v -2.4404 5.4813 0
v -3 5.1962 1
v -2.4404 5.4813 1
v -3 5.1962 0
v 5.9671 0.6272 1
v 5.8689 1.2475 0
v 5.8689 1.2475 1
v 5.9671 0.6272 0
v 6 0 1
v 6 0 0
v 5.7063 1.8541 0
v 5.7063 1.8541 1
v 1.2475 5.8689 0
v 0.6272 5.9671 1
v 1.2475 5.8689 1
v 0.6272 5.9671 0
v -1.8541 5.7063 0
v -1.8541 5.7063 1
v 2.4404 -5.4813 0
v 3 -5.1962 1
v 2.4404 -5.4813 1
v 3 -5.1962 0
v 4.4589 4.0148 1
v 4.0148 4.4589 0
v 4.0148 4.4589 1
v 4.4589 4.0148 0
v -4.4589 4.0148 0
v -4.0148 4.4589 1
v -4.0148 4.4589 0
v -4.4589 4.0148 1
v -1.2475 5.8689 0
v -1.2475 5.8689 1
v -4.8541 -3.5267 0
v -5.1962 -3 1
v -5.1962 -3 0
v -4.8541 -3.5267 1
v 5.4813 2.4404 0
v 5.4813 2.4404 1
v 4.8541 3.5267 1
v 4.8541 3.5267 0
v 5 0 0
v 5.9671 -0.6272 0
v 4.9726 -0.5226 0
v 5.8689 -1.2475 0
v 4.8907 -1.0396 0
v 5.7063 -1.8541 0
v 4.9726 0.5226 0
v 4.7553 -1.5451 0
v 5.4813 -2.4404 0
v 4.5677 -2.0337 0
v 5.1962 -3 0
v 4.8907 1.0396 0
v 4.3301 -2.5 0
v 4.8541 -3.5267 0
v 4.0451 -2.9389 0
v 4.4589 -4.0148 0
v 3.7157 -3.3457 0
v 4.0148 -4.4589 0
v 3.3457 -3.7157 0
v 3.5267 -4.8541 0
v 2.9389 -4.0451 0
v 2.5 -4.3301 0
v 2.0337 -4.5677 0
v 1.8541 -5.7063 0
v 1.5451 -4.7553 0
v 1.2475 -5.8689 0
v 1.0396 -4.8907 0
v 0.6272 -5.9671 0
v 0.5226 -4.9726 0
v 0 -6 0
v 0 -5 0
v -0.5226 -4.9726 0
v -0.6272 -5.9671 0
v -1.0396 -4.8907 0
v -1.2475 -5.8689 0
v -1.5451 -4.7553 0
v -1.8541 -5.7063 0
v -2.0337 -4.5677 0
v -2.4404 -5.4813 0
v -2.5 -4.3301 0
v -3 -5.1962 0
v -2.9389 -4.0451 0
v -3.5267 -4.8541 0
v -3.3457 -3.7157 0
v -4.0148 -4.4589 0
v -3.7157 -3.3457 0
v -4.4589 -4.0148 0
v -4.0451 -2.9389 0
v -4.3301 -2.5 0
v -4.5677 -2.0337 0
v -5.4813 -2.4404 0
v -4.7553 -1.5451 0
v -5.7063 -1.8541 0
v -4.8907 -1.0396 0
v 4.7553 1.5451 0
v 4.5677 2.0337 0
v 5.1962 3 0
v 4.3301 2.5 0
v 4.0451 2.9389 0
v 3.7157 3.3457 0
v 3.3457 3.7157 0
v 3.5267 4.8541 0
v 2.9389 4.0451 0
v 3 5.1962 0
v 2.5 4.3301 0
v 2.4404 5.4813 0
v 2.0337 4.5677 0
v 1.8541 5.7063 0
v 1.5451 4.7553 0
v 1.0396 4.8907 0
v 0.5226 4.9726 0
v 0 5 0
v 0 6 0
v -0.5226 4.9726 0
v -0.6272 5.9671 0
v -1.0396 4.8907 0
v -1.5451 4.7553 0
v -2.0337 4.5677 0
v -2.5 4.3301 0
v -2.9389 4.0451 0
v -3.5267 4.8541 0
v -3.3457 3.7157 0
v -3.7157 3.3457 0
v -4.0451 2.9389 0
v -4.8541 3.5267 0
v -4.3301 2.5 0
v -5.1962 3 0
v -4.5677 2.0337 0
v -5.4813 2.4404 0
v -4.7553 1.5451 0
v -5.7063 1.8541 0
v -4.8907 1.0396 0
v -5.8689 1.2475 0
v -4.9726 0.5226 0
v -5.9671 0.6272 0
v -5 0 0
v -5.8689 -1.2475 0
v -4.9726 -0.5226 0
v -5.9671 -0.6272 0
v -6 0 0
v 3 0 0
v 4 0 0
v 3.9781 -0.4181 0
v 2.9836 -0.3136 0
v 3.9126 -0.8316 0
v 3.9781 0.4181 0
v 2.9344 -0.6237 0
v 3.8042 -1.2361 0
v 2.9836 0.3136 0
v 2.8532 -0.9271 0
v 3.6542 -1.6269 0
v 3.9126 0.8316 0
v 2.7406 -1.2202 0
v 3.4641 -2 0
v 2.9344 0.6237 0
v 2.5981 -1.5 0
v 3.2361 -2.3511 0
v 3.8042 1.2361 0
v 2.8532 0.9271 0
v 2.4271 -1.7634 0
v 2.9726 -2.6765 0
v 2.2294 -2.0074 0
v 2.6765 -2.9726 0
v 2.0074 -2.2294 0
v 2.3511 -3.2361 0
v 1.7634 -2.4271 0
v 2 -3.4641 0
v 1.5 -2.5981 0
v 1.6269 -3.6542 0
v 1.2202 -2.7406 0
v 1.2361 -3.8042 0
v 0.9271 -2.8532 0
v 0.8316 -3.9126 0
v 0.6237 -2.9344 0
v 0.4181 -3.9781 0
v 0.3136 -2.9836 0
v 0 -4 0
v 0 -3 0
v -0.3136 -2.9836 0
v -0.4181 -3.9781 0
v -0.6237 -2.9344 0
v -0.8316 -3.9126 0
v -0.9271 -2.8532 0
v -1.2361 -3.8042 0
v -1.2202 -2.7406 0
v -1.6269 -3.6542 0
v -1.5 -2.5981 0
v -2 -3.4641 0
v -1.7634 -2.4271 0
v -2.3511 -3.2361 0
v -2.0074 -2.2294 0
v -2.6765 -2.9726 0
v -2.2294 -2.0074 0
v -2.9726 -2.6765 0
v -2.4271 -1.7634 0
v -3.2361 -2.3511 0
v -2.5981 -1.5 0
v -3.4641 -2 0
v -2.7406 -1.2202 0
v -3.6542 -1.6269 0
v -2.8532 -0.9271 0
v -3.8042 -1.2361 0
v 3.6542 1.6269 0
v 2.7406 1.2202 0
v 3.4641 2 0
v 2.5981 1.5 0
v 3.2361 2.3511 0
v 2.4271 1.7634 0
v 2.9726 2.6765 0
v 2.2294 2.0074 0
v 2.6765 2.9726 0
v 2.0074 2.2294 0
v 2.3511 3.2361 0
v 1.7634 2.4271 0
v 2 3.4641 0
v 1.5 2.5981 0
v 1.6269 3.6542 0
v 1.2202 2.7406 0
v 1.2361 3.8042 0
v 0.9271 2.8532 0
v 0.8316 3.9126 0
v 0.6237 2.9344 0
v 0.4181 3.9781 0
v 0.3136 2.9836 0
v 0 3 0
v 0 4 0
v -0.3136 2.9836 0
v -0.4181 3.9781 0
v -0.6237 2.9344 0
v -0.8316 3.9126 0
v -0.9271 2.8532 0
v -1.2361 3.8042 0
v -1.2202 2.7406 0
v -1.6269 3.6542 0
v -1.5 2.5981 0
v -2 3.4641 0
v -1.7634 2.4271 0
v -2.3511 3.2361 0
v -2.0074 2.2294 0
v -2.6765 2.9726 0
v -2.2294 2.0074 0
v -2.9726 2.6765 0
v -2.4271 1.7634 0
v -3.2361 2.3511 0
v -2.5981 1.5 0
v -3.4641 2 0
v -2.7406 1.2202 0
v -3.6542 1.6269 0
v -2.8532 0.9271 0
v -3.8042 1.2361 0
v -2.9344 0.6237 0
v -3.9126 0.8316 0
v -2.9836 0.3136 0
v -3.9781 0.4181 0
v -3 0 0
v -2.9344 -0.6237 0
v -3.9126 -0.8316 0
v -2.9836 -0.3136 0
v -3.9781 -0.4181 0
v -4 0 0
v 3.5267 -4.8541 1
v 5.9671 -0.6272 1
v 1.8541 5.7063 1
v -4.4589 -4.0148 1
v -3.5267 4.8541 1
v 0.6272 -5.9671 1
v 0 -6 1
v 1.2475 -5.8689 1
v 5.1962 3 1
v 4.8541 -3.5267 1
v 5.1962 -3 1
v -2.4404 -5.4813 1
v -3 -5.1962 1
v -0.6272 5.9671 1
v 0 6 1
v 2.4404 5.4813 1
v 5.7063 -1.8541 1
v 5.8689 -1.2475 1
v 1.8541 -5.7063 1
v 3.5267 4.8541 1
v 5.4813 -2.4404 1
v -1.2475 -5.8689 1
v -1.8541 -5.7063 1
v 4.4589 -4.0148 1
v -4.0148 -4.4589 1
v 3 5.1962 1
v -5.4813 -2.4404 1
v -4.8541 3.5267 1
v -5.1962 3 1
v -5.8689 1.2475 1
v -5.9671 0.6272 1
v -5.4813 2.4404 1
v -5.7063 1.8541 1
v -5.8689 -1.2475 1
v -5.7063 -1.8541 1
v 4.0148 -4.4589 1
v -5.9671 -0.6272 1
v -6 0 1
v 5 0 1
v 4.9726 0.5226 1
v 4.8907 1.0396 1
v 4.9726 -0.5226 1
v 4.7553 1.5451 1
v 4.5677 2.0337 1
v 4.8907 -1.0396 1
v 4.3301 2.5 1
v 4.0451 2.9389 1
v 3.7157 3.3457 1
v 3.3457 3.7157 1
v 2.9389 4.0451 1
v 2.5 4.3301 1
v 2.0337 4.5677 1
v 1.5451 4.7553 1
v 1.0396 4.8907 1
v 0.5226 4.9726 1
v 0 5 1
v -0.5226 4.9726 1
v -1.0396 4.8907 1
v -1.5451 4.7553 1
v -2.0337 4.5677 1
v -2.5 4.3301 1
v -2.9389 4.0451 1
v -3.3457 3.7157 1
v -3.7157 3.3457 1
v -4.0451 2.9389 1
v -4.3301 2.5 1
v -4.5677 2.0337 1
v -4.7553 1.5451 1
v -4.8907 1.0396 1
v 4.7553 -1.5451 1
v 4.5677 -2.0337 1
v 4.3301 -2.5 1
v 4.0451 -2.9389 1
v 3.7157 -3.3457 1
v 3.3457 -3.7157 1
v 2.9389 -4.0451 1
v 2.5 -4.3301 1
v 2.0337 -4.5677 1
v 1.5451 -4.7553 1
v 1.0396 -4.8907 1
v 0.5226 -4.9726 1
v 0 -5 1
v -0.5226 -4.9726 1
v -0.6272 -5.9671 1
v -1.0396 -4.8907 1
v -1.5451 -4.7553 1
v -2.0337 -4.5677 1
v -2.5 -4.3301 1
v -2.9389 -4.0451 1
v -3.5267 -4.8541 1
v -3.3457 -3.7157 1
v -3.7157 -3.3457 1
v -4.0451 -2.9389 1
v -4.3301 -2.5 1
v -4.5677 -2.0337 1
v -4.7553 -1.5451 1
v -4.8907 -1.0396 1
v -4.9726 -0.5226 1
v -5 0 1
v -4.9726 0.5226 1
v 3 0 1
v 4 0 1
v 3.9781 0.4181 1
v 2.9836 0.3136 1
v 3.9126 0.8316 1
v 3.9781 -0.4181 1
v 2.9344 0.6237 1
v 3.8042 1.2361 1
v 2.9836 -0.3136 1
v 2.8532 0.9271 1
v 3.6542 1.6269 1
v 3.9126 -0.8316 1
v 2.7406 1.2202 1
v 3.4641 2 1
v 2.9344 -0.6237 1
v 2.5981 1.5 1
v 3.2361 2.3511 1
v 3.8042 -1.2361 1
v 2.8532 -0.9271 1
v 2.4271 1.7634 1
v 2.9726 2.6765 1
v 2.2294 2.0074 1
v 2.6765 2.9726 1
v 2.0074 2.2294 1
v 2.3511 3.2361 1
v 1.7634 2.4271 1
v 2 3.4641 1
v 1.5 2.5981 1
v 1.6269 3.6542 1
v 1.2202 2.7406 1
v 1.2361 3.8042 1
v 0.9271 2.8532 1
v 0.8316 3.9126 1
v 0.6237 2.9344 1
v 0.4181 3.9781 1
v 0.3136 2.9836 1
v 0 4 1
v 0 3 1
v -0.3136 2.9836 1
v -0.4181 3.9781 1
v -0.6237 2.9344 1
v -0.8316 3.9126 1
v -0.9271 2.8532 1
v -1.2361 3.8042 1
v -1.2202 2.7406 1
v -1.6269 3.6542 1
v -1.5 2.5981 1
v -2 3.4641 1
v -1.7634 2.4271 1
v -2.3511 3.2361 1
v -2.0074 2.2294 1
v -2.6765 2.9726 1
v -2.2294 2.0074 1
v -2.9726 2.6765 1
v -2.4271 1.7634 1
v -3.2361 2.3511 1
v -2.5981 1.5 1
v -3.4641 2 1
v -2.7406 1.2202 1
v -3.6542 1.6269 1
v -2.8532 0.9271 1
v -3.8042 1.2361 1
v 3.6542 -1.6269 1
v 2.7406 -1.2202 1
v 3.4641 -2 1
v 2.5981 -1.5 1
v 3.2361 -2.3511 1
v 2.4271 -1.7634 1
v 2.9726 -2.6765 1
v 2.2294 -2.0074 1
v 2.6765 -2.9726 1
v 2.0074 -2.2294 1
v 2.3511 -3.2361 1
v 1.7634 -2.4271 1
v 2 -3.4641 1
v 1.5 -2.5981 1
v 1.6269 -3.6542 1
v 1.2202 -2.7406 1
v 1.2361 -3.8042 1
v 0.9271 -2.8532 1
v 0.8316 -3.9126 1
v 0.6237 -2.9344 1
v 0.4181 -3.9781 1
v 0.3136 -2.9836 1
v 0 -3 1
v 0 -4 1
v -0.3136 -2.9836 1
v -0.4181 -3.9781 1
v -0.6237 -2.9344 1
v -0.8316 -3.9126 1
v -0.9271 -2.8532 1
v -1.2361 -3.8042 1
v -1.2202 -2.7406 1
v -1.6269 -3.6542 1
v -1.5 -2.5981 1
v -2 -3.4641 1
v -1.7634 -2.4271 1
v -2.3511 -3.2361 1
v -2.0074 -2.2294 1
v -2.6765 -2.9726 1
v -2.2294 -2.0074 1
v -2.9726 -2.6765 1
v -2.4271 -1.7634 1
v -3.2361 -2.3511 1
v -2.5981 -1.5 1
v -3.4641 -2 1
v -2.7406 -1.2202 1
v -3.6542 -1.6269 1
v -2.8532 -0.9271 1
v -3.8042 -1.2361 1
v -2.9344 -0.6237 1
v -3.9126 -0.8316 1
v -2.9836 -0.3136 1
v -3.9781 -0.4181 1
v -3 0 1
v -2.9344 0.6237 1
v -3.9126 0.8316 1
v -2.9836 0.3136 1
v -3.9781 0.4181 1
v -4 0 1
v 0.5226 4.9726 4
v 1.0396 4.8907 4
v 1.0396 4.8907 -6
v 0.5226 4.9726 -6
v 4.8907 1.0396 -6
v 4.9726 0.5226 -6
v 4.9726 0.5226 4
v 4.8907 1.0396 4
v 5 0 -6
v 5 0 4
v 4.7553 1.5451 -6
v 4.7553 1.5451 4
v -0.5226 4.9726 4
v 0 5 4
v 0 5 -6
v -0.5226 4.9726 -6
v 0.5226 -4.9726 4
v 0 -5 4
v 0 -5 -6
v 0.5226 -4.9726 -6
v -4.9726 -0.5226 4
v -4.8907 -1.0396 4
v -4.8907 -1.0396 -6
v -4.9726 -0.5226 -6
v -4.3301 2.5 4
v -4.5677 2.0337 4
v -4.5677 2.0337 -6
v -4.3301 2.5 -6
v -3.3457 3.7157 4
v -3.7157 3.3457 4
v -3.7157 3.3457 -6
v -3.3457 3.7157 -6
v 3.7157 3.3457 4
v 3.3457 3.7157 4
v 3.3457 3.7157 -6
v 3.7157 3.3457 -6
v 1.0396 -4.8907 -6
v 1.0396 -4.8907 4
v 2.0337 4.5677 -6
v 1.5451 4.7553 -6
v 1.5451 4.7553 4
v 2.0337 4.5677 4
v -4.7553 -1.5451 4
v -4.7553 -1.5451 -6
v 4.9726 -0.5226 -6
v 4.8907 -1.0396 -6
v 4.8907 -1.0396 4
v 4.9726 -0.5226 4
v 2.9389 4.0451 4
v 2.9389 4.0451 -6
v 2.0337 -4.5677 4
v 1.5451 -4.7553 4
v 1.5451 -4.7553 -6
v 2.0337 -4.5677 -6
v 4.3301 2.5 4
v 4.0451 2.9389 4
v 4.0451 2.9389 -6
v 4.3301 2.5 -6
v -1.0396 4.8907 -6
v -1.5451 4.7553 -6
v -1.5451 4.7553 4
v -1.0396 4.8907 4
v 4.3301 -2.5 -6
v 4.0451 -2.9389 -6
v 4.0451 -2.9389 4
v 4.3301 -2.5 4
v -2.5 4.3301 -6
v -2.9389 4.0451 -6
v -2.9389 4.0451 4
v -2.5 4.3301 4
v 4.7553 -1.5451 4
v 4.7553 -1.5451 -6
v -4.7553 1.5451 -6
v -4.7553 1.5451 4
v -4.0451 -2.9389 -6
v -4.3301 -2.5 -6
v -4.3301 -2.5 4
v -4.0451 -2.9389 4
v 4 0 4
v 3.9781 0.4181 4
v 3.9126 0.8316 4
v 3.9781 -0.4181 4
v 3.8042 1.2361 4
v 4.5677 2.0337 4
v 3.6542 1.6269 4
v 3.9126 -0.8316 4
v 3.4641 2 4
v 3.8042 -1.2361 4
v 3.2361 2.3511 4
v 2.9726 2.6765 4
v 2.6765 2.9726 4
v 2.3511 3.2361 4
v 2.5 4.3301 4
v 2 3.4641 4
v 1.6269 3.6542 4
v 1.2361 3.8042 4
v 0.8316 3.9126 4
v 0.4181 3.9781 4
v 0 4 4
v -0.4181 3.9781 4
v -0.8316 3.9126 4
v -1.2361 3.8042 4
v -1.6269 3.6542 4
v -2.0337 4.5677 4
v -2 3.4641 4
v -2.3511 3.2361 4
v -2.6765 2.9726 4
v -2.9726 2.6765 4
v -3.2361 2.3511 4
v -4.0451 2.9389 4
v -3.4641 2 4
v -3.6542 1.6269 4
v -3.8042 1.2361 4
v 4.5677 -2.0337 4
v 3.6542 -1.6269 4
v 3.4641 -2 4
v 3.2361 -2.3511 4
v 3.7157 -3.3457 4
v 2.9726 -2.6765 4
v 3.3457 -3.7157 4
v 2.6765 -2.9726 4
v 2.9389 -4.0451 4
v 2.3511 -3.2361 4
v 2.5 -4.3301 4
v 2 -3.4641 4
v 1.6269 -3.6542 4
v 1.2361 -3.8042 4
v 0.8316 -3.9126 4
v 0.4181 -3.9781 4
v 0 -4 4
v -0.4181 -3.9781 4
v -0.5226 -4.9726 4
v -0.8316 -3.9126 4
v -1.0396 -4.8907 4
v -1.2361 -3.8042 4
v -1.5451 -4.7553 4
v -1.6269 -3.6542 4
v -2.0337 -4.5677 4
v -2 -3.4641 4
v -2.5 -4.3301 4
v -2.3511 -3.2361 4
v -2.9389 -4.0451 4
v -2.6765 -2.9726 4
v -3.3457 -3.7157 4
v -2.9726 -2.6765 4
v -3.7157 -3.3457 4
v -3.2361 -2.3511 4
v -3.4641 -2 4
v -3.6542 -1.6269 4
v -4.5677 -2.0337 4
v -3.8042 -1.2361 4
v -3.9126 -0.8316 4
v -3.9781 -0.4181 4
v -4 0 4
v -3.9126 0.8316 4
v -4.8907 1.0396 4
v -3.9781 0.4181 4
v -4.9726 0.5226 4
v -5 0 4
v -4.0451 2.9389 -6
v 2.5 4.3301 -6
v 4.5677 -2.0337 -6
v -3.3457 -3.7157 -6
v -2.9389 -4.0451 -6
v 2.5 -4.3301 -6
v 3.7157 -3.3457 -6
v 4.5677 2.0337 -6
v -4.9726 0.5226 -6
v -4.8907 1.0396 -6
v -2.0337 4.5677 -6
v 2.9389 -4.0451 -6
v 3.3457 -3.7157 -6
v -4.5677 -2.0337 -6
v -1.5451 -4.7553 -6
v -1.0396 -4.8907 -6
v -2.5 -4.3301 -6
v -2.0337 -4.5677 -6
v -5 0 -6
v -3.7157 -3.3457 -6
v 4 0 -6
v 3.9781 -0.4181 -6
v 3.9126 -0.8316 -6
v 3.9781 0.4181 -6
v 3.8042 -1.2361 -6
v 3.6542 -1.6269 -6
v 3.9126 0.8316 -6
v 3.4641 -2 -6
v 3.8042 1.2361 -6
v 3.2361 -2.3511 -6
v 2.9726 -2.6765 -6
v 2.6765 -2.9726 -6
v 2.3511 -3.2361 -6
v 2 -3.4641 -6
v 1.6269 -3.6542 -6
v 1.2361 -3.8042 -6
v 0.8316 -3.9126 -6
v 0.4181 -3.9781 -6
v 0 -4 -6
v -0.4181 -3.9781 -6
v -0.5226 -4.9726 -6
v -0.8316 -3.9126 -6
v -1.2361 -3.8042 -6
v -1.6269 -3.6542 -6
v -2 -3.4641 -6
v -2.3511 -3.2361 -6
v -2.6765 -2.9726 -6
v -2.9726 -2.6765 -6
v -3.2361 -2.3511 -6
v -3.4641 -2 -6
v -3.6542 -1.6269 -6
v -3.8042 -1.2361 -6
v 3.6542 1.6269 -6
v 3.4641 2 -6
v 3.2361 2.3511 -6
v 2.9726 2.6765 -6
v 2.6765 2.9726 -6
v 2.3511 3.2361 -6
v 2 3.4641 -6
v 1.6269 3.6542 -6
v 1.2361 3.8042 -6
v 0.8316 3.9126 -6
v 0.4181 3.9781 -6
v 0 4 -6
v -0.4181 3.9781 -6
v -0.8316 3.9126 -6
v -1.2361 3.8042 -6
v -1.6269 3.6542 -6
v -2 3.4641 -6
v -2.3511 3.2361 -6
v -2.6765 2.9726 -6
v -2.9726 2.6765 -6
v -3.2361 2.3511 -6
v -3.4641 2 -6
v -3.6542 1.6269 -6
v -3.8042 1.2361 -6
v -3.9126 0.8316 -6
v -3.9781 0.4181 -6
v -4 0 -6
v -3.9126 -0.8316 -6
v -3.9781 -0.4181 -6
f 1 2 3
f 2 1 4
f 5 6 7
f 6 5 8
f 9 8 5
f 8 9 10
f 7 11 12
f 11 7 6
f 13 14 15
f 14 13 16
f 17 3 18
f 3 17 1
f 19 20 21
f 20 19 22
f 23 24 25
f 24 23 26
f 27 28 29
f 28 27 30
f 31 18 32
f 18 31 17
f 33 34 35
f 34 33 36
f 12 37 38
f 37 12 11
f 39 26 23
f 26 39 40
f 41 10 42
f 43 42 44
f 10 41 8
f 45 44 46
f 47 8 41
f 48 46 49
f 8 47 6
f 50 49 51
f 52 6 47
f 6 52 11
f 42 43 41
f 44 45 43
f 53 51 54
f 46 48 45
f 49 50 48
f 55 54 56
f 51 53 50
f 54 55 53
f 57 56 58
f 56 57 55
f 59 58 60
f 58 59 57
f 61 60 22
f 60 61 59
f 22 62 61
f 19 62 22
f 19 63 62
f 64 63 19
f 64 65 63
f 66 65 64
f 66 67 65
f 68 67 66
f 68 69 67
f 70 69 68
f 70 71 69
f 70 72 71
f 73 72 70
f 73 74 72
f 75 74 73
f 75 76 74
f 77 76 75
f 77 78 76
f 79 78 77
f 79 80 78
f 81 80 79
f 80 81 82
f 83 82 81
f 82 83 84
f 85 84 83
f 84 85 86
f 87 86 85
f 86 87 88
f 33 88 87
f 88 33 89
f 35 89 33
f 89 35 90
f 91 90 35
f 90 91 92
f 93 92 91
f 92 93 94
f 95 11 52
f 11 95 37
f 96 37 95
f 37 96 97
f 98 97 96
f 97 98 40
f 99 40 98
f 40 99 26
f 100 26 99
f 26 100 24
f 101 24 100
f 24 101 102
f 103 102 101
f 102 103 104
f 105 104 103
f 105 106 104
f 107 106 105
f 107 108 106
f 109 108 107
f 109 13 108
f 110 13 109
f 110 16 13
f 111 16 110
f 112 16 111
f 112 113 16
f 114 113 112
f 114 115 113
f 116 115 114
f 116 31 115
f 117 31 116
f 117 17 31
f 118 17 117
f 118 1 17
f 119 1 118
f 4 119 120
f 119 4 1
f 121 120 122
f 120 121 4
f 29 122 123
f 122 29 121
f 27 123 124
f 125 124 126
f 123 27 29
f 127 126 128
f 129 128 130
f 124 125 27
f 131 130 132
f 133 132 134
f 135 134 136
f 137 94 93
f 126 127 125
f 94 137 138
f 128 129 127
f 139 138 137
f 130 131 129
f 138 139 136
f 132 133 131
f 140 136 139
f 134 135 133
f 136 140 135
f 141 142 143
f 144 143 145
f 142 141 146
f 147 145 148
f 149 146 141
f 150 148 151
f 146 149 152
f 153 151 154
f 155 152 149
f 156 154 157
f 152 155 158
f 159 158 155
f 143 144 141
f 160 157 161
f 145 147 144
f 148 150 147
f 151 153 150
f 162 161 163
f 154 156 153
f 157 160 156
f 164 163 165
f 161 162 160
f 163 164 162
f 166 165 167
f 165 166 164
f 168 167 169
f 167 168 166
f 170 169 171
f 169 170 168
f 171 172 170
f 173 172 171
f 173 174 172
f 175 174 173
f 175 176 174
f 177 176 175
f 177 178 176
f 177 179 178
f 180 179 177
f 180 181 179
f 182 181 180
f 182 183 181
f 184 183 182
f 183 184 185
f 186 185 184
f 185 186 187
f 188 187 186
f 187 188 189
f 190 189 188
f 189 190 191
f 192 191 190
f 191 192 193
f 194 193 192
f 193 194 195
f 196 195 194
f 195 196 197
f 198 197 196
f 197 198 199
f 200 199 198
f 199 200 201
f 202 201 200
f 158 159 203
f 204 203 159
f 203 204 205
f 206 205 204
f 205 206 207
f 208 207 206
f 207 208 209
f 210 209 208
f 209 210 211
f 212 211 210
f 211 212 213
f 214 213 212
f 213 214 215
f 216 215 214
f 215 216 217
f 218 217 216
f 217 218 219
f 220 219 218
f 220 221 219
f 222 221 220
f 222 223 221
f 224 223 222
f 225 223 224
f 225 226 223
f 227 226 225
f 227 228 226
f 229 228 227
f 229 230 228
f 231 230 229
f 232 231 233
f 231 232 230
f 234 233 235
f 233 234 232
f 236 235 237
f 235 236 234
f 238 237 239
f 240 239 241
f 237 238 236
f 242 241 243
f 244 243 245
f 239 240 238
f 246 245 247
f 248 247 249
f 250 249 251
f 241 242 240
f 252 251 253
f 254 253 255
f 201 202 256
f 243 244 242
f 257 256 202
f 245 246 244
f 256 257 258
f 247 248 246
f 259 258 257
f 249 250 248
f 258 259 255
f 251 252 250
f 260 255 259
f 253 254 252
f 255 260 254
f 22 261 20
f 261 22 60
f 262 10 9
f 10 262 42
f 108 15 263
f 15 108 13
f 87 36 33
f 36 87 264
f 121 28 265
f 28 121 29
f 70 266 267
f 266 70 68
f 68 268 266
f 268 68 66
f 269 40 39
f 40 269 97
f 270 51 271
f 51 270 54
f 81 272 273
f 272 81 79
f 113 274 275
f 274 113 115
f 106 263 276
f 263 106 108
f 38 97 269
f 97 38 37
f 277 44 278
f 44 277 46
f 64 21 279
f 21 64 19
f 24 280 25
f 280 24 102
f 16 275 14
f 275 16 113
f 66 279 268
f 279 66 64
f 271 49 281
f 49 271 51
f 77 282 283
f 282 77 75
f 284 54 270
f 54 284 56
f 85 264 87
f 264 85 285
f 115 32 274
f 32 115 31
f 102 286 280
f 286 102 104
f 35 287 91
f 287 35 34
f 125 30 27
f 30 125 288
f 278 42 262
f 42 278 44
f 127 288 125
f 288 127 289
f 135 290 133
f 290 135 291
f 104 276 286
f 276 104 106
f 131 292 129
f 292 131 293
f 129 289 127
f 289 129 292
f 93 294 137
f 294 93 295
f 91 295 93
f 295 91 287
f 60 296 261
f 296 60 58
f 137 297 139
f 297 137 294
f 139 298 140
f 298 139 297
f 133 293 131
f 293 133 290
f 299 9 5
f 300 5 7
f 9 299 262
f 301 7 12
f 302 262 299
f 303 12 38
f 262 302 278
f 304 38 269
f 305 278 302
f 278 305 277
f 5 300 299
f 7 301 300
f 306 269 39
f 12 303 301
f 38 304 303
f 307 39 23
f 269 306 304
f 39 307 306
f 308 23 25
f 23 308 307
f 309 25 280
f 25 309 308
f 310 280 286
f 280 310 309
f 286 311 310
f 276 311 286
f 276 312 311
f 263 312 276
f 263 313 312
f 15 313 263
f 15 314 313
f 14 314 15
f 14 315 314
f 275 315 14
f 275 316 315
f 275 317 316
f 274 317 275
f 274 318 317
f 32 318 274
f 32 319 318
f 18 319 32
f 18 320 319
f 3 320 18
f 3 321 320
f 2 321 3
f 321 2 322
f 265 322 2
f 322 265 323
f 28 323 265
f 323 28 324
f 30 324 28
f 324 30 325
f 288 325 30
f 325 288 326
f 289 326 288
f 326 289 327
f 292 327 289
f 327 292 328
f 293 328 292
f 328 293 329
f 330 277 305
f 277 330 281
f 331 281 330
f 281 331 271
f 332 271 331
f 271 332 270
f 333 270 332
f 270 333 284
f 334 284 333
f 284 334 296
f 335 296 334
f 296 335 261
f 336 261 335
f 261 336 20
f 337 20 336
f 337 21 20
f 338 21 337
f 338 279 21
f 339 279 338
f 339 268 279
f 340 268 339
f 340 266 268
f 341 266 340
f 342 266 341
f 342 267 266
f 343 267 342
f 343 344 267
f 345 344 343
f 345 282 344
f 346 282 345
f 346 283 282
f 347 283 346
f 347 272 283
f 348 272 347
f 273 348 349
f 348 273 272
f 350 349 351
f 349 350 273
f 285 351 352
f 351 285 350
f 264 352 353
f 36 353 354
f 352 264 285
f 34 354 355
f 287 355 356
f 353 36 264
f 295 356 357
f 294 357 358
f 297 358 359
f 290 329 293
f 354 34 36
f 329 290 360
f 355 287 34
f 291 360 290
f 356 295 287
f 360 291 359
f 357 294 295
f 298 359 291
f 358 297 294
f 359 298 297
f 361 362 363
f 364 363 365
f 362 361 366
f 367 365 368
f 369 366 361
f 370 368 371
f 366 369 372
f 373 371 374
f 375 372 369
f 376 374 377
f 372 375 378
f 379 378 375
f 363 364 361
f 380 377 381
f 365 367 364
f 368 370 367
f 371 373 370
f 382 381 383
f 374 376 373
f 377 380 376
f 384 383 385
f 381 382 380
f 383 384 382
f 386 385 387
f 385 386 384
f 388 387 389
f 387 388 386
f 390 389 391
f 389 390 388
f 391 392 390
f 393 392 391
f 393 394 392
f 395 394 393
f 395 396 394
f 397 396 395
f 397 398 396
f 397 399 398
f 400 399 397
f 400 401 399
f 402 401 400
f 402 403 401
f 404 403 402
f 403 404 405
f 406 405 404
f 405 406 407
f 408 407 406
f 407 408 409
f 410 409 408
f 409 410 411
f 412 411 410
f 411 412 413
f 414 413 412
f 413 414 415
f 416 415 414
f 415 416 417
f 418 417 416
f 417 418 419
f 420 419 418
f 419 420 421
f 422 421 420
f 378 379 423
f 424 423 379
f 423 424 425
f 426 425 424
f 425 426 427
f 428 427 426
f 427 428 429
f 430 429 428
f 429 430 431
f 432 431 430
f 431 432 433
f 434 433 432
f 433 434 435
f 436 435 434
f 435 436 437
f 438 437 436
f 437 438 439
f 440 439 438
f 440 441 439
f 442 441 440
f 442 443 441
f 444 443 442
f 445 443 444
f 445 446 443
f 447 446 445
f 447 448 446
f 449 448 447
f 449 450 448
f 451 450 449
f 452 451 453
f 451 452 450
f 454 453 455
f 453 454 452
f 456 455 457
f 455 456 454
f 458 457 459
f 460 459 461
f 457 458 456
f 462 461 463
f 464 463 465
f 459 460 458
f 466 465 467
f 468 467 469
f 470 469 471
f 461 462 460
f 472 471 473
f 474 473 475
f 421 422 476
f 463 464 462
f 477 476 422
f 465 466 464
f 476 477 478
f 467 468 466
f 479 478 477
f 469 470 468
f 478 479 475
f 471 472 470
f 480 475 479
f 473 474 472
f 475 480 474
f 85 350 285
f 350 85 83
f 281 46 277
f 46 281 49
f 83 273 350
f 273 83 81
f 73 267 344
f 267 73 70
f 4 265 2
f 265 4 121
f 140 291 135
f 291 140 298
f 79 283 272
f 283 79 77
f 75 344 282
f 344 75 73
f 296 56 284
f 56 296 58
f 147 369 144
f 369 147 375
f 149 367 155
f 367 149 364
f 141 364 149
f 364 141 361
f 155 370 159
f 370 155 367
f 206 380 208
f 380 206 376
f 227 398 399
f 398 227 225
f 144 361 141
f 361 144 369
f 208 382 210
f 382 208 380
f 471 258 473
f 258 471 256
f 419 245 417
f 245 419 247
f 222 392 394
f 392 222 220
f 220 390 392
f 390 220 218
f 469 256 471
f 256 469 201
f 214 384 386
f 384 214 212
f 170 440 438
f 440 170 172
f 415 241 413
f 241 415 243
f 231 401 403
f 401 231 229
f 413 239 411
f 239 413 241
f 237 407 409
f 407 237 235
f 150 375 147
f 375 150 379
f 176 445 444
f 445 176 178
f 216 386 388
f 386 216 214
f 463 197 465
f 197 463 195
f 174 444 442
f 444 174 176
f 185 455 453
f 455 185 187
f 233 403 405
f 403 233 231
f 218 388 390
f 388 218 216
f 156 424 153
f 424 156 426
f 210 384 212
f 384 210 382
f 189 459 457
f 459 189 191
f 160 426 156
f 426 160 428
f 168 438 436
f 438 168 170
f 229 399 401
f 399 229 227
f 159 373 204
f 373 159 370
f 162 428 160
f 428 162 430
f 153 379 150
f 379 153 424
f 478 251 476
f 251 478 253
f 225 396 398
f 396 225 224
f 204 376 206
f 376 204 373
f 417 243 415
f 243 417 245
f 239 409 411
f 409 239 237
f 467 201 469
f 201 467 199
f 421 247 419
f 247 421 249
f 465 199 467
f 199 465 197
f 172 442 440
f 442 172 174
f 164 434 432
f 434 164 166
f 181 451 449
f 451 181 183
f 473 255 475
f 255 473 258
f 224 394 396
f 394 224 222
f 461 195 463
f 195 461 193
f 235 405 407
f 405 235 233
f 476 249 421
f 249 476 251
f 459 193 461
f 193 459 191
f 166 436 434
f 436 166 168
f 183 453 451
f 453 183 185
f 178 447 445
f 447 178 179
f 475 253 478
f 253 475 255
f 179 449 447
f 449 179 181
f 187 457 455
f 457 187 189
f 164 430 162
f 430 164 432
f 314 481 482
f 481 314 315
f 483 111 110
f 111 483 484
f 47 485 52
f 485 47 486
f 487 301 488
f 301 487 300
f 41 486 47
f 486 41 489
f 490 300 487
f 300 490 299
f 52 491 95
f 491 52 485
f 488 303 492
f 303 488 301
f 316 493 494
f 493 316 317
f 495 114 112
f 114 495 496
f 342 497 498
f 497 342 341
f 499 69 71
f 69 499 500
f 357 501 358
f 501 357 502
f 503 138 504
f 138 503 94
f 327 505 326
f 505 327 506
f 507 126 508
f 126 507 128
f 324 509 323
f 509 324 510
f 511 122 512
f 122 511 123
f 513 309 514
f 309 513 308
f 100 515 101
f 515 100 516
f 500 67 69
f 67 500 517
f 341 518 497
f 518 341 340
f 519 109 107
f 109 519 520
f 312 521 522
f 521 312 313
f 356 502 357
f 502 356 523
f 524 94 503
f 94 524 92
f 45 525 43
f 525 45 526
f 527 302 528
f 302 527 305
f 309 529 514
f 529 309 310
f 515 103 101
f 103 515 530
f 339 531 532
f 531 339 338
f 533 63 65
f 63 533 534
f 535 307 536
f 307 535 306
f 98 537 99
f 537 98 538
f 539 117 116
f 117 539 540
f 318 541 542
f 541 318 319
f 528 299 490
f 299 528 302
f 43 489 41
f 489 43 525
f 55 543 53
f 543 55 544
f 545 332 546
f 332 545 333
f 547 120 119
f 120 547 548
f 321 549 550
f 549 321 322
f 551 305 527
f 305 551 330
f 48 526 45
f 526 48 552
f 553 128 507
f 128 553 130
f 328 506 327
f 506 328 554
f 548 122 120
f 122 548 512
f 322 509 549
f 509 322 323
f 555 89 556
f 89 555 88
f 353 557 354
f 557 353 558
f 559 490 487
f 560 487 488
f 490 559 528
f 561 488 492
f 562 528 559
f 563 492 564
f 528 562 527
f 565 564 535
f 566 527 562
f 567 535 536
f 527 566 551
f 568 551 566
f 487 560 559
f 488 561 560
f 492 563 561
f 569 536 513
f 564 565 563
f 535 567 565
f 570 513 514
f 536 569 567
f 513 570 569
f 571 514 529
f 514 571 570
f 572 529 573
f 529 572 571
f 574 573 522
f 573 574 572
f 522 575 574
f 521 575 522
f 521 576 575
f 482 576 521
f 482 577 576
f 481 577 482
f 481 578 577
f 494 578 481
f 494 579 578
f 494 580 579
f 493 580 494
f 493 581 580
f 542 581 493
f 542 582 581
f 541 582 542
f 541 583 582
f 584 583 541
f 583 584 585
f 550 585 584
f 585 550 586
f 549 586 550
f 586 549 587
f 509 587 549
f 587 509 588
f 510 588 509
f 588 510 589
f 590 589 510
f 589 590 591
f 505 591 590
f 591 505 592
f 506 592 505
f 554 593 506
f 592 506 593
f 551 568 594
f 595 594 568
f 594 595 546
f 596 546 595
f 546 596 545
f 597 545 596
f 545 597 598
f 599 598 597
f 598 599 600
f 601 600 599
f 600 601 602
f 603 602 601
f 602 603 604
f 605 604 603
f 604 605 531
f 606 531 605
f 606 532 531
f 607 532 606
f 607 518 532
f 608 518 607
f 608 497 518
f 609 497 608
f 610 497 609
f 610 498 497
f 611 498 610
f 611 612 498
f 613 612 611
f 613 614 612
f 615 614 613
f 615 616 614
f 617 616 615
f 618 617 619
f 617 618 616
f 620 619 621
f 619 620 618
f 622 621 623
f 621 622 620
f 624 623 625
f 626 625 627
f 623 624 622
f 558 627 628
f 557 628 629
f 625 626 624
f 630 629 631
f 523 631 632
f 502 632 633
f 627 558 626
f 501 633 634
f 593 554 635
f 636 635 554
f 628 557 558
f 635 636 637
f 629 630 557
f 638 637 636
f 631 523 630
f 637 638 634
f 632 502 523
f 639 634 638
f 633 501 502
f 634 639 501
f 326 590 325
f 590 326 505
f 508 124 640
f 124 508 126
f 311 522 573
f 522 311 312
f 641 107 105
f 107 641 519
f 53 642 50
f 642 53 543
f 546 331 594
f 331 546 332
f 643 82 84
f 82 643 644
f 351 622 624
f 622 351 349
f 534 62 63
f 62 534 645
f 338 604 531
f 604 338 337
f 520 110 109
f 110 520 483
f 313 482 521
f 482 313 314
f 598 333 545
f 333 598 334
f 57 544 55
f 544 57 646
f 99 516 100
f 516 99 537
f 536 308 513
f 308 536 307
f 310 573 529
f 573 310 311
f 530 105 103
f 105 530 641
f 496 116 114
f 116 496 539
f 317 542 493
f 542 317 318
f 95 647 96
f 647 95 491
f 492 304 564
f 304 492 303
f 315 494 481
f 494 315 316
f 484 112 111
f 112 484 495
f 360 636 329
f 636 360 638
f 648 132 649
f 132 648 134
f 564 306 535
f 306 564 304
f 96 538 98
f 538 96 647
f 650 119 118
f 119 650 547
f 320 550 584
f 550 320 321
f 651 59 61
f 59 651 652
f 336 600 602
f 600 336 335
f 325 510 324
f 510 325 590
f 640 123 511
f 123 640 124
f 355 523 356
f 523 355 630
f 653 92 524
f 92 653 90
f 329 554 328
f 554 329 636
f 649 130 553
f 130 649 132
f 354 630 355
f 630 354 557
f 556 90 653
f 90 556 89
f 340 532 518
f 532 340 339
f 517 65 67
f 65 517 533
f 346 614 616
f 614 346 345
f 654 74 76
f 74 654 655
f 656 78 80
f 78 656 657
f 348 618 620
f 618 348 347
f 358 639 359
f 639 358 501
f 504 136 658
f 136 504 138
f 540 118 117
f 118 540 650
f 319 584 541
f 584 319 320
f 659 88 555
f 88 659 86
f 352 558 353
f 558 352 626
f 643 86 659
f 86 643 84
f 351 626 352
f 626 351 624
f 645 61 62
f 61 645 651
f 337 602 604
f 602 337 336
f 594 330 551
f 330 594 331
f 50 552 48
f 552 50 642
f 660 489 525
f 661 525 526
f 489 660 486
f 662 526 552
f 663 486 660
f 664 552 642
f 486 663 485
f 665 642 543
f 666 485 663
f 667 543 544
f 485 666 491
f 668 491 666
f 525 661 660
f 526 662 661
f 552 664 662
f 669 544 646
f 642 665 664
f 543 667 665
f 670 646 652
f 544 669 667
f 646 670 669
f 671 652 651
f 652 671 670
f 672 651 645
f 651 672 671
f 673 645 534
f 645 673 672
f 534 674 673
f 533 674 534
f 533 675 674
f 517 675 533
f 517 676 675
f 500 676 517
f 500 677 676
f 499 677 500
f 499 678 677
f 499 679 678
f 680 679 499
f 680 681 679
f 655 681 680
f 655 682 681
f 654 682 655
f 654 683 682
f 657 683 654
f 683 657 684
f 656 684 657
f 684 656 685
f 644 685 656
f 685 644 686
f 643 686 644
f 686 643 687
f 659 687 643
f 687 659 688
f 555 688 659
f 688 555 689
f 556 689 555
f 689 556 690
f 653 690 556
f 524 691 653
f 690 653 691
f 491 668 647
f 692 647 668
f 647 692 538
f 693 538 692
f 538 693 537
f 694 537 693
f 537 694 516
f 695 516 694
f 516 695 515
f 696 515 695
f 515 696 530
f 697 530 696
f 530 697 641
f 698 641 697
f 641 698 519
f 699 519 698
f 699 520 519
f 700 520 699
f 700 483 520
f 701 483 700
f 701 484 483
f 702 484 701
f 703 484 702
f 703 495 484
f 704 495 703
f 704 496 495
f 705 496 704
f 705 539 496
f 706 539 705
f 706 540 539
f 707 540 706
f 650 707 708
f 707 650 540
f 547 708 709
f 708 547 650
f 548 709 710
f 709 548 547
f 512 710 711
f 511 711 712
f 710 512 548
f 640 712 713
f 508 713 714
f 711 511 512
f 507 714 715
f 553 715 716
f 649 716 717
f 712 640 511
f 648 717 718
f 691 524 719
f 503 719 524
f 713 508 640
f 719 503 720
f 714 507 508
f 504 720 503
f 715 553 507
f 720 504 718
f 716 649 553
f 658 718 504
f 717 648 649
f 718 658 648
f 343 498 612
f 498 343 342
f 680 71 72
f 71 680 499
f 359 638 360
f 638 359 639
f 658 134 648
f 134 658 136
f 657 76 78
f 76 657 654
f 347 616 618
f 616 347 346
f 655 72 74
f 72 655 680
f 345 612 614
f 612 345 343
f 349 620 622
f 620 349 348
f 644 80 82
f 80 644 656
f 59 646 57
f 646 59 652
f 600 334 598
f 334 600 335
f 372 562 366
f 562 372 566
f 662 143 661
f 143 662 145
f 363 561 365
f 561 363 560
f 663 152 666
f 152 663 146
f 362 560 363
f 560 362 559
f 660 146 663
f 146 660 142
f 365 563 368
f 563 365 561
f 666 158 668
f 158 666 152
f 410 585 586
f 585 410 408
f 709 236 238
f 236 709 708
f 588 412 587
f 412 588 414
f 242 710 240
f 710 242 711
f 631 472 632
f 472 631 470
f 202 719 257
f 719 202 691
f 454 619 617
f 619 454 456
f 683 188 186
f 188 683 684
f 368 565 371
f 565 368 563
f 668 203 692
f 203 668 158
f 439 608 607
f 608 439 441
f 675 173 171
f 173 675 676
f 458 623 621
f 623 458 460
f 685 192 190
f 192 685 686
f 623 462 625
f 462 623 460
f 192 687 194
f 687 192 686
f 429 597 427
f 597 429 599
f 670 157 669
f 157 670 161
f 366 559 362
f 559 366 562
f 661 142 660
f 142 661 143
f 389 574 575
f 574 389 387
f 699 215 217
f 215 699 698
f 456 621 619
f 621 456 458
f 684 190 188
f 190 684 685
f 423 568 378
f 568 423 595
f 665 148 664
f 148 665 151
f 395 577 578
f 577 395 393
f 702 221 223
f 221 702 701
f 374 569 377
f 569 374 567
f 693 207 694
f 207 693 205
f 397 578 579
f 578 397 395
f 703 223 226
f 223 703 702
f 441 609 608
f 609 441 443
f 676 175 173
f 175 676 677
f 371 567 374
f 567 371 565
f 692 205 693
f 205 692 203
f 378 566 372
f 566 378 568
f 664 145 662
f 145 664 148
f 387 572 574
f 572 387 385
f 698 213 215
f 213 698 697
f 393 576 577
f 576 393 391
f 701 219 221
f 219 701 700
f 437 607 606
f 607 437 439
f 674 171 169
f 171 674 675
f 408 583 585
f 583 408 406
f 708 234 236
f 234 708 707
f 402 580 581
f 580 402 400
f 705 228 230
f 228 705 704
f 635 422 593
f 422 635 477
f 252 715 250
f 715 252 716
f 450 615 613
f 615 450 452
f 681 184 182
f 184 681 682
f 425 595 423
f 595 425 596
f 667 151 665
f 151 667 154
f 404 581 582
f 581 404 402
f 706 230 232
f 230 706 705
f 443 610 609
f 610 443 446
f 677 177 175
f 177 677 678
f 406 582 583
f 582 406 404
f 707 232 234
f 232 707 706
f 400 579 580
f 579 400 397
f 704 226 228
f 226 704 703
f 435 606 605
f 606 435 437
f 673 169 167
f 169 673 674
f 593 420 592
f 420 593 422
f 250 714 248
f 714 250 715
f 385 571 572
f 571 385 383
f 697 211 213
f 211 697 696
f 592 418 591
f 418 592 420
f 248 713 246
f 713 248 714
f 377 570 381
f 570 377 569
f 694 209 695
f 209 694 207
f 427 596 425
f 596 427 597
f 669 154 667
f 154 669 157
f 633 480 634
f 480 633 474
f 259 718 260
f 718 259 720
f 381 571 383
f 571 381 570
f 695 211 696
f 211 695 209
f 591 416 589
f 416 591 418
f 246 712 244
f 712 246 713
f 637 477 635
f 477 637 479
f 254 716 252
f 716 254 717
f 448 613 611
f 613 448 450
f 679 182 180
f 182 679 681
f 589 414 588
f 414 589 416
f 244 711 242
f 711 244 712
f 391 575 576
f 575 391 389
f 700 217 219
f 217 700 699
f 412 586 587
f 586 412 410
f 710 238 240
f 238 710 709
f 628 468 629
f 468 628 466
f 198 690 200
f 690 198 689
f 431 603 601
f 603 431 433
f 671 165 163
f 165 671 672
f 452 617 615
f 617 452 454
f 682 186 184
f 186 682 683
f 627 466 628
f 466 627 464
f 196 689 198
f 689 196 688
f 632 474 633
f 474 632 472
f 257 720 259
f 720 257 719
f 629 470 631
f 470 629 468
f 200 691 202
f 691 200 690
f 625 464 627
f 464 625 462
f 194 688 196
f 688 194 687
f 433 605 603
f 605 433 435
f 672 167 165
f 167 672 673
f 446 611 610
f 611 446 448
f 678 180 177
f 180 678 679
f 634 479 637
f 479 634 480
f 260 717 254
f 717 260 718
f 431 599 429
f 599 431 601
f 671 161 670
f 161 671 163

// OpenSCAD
// inner diameter
solidInner = 6;

// outer diameter
solidOuter = 12;

// thickness
solidThickness = 1;

// inner diameter
hollowInner = 8;

// outer diameter
hollowOuter = 10;

// thickness
hollowThickness = 10;

// offset
offset = -6;



module washer (inner, outer, thickness) {

    difference() {
        cylinder(d=outer, h=thickness, $fn=60);
        translate([0,0,-thickness])
        cylinder(d=inner, h=thickness*3, $fn=60);
    };
}

union() {
    washer (solidInner, solidOuter, solidThickness);
    translate ([0,0,offset]) washer (hollowInner, hollowOuter, hollowThickness);
}
